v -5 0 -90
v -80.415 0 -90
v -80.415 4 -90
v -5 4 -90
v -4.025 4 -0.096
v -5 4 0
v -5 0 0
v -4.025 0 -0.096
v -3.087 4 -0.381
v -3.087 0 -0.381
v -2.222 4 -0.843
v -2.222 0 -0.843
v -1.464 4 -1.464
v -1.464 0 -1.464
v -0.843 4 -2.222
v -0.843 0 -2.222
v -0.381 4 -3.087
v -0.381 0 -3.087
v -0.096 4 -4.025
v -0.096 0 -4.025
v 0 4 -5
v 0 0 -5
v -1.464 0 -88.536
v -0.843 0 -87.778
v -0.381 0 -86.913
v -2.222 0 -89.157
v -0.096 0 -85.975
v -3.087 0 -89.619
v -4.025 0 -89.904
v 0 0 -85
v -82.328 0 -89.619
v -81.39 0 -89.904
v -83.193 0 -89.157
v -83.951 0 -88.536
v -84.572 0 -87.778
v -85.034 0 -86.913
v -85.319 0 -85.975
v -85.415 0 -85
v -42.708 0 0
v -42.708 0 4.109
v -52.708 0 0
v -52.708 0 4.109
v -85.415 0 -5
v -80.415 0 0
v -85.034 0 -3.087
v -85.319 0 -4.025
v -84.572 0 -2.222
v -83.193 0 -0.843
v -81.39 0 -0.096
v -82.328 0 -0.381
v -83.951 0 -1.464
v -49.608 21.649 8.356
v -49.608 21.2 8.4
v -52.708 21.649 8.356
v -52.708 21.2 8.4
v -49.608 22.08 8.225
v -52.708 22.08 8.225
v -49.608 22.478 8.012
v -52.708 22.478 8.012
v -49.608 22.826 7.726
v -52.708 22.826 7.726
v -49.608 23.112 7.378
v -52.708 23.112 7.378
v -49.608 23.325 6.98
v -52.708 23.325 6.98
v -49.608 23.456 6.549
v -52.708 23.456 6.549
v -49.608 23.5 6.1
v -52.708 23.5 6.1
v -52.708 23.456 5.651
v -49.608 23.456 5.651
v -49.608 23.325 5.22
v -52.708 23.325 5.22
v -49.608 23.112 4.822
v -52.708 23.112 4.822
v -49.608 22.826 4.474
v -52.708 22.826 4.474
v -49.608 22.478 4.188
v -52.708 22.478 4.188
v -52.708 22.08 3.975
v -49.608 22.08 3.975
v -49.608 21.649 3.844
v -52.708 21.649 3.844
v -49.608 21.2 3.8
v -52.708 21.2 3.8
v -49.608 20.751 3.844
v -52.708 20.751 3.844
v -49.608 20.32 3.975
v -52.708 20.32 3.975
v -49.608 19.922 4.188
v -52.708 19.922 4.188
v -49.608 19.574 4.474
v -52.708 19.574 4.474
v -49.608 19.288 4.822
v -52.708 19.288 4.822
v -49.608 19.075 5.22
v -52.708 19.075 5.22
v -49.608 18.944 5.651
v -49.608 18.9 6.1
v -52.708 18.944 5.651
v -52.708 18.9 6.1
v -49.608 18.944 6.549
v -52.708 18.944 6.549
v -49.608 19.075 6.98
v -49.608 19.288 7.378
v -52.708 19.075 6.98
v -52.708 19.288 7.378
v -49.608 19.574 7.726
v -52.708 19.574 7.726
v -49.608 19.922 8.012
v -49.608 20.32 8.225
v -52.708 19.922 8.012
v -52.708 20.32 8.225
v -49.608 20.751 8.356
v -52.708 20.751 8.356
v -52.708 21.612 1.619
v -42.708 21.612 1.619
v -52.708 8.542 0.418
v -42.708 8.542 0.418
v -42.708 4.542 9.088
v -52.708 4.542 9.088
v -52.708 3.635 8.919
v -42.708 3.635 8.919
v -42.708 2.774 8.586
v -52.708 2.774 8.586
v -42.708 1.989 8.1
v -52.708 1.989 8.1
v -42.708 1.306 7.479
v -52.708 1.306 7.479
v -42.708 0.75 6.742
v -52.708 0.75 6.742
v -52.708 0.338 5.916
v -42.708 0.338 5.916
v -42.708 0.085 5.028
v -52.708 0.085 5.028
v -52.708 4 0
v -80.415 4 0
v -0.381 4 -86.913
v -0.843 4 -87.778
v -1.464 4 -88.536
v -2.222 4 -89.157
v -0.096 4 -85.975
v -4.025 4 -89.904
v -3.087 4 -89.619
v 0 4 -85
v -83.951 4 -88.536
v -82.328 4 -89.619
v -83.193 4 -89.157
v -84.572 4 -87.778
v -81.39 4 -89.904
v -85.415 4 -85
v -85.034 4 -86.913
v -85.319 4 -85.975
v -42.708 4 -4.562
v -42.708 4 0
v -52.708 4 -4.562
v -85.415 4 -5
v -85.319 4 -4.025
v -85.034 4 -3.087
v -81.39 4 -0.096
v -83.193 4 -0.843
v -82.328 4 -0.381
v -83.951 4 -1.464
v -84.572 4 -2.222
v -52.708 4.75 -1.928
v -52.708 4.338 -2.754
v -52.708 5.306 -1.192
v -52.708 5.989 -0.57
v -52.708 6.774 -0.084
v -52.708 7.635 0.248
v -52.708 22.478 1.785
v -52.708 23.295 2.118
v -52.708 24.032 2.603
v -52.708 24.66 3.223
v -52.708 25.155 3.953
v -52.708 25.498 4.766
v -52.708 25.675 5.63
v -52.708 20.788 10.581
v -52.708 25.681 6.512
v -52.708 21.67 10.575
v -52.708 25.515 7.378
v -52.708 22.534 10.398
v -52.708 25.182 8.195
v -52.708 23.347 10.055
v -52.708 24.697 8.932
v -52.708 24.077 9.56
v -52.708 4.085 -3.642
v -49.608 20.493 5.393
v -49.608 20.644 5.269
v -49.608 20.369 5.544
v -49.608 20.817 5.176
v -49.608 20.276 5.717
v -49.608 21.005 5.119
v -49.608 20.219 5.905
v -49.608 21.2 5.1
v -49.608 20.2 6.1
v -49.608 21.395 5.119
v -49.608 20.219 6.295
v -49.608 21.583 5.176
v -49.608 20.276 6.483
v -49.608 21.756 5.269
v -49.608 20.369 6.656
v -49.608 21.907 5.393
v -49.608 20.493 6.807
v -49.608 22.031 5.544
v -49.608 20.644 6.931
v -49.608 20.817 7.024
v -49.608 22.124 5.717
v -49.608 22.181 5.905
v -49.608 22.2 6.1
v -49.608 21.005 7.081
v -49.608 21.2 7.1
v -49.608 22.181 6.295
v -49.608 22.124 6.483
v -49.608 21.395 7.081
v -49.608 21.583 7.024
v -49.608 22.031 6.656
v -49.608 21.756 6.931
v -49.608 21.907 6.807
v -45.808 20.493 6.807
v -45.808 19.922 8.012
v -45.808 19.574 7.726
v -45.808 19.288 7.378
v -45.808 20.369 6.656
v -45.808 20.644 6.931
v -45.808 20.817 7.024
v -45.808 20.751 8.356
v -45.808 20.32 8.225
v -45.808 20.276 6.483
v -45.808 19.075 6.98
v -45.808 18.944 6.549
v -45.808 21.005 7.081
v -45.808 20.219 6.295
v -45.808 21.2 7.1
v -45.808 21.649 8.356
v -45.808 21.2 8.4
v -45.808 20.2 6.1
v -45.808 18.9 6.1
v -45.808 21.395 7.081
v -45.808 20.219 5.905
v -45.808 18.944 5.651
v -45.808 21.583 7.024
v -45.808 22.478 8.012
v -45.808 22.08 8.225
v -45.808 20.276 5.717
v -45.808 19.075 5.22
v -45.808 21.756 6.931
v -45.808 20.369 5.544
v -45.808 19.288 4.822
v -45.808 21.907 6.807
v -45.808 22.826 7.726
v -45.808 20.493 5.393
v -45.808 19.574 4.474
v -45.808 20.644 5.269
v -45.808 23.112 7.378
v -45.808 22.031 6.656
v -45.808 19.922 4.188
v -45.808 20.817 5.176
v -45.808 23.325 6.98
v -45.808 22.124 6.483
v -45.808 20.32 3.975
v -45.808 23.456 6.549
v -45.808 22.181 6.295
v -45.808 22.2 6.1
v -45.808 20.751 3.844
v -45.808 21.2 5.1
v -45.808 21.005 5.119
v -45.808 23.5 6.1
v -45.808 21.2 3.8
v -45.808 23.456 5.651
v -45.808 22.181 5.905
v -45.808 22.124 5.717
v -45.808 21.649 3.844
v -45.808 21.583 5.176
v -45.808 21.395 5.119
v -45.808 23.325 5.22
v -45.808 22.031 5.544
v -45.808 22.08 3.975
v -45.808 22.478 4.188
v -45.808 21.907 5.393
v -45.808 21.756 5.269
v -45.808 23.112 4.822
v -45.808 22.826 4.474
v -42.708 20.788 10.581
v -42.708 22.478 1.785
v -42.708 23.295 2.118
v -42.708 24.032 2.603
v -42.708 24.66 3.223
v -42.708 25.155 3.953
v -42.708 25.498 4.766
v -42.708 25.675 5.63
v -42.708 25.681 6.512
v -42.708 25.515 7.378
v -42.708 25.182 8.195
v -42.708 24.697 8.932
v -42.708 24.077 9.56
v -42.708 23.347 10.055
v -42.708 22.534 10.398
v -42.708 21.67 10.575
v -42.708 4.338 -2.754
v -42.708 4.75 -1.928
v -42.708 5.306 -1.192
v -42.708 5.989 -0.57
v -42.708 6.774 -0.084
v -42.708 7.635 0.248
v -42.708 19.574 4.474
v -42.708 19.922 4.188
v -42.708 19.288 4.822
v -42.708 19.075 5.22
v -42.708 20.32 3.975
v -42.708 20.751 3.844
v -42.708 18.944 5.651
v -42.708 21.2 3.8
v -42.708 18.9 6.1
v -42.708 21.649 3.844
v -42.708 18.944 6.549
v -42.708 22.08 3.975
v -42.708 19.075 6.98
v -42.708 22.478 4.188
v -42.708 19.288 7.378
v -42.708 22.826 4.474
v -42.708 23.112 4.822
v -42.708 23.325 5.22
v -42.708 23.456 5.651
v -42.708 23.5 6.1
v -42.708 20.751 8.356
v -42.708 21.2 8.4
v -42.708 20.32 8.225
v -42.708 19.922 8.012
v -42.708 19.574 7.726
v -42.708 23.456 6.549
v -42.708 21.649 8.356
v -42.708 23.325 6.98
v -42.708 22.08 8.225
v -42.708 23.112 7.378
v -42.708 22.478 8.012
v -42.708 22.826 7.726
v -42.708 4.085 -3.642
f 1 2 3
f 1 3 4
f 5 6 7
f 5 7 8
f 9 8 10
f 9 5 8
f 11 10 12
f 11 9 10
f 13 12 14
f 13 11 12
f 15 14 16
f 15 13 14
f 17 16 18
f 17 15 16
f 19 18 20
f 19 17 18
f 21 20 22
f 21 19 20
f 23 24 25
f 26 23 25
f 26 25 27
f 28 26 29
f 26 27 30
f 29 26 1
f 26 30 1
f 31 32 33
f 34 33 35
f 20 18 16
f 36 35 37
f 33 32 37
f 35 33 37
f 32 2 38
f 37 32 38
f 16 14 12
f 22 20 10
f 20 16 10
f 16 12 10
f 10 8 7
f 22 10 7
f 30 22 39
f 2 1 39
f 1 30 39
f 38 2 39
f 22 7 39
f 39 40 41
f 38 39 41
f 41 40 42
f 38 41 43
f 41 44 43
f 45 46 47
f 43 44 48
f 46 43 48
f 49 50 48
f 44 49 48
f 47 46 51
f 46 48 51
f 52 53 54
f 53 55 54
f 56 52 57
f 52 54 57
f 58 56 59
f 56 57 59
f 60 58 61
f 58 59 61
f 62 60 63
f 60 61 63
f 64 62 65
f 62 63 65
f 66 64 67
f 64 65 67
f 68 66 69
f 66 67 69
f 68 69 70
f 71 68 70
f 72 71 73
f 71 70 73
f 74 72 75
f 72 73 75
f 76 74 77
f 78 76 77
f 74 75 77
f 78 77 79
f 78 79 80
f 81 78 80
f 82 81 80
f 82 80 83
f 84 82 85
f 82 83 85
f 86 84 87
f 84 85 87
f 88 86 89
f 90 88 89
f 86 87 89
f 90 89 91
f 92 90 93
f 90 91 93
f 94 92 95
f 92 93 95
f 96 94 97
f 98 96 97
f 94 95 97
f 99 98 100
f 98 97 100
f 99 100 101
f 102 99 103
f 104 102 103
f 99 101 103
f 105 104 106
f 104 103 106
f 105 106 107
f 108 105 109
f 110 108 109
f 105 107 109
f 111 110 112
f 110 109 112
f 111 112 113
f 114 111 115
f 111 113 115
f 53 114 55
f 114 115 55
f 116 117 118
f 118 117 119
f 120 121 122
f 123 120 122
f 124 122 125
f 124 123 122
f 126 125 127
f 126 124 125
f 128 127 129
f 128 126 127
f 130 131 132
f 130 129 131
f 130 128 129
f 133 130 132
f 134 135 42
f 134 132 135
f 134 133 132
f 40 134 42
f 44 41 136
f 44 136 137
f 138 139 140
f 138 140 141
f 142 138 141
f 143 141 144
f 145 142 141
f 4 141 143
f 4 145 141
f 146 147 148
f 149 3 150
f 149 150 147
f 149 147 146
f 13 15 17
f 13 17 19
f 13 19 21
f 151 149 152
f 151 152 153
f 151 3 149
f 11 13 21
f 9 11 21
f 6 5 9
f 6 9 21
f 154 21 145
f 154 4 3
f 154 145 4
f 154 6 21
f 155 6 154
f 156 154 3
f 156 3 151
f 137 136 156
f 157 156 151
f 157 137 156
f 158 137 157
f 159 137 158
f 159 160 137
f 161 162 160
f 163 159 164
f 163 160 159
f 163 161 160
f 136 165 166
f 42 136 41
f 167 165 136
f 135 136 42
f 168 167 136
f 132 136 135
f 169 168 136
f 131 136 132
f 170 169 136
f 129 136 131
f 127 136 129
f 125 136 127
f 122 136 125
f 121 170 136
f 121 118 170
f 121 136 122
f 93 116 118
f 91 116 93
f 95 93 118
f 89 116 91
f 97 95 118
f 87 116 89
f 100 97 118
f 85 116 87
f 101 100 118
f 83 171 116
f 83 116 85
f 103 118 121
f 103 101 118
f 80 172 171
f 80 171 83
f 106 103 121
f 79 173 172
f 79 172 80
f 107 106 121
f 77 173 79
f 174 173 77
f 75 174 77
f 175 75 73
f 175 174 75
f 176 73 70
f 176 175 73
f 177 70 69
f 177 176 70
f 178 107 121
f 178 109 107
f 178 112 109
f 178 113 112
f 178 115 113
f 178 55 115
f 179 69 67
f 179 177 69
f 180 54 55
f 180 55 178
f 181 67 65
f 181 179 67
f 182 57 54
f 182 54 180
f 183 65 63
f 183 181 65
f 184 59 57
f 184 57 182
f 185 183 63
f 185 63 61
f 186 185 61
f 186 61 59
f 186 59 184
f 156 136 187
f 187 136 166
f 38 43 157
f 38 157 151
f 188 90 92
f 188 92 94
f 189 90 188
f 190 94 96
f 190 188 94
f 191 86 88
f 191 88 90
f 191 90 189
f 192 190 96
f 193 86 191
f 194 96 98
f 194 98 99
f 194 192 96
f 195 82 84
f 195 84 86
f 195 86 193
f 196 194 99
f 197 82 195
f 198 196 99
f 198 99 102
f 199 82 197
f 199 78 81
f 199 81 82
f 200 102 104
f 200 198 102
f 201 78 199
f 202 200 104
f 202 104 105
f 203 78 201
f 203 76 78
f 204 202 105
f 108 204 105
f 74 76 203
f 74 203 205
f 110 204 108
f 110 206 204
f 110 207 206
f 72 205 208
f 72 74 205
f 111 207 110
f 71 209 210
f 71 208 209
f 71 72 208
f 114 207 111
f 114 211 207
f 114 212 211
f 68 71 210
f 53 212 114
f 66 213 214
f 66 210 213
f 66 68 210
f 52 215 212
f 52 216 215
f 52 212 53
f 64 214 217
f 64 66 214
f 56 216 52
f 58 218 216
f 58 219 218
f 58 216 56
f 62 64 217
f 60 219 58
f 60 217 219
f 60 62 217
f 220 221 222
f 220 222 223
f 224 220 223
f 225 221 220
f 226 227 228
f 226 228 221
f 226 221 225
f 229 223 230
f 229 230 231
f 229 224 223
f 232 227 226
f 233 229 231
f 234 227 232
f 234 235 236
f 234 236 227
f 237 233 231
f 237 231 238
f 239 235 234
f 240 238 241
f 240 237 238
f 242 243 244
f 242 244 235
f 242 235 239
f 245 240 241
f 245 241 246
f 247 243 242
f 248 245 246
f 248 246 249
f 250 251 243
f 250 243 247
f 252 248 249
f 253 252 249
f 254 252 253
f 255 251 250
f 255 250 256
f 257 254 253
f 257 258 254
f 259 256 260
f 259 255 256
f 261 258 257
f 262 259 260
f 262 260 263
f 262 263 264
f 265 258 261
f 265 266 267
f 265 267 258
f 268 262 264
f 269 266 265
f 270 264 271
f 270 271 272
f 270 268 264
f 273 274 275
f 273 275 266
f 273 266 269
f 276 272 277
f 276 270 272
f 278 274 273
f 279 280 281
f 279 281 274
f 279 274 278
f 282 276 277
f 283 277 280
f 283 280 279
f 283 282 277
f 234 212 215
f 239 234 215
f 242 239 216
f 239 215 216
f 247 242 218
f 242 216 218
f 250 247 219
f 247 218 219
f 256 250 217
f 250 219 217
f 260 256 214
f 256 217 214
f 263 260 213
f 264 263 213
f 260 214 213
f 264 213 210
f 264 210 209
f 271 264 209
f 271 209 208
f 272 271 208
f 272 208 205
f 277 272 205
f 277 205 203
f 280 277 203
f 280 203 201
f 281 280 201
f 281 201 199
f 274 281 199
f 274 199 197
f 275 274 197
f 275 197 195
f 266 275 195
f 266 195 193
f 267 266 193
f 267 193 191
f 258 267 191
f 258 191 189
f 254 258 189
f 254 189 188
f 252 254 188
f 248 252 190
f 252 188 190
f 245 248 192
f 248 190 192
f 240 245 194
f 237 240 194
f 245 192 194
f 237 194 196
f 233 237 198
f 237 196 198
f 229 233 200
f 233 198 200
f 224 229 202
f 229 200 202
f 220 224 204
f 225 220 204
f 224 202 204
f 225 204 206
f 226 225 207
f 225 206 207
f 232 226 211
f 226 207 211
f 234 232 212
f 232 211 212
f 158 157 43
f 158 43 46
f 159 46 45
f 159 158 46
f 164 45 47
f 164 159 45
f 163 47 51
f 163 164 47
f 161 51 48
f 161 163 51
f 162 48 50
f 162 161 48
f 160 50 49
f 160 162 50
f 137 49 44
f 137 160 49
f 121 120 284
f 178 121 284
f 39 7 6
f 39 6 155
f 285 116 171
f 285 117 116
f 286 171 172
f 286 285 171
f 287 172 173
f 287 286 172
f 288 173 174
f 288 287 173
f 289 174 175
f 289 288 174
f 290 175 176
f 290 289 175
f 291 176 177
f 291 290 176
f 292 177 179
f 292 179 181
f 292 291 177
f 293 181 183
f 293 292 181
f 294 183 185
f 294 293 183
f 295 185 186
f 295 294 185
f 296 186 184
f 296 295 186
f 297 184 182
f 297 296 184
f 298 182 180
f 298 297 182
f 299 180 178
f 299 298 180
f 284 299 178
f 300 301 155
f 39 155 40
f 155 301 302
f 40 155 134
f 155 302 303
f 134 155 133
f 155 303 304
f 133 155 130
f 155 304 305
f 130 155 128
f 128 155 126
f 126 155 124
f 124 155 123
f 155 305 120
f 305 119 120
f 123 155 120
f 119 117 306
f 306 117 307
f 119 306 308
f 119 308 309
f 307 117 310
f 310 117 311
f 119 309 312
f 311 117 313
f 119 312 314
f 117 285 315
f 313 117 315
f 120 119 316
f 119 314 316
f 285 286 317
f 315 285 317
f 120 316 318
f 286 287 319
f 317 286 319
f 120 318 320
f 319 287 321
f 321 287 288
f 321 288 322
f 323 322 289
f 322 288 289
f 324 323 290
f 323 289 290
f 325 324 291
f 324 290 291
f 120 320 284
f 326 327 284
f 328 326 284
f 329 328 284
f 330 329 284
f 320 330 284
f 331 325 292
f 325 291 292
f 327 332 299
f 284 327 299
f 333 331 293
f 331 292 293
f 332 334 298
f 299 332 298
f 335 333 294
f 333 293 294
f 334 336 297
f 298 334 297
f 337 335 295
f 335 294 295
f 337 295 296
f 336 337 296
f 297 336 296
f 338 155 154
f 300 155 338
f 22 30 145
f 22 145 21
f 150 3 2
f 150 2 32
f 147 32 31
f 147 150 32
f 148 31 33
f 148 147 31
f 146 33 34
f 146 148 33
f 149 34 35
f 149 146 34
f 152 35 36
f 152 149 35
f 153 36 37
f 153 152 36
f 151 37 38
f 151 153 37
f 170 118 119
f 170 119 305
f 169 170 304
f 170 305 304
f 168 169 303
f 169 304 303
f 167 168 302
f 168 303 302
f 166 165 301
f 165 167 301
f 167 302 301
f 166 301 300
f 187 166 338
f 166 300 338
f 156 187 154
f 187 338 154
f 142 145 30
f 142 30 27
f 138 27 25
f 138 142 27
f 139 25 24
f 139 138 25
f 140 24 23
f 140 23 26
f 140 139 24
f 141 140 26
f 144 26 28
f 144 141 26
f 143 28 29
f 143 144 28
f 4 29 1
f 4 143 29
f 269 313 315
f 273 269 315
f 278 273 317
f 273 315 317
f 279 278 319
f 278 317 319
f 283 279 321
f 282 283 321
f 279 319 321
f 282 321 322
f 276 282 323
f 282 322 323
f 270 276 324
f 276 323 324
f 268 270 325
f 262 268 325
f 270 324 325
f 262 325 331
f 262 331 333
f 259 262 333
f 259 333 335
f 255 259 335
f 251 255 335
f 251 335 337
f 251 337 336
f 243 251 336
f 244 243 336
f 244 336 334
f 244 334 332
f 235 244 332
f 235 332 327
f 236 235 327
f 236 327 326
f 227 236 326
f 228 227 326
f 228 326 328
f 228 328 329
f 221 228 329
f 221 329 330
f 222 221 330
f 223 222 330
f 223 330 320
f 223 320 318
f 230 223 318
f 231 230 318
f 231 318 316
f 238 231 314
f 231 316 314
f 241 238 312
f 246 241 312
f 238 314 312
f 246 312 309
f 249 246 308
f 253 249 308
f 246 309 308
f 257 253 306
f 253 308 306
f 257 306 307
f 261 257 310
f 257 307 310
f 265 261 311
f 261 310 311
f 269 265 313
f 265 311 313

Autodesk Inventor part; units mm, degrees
ref_plane "YZ Plane" through (0, 0, 0) normal (1, 0, 0) x (0, 1, 0)
sketch "Sketch1" plane through (0, 0, 0) normal (0, 1, 0) x (-1, 0, 0)
  line L0 (0, 0) -> (85.415, 0)
  line L1 (85.415, 0) -> (85.415, -90)
  line L2 (85.415, -90) -> (0, -90)
  line L3 (0, -90) -> (0, 0)
  dimension "d0" = 85.415
  dimension "d1" = 90
extrude "Extrusion1" add sketch "Sketch1" along normal blind 4
ref_plane "Work Plane1" through (-42.7075, 0, 0) normal (1, 0, 0) x (0, 0, -1)
ref_plane "Work Plane2" through (-42.7075, 0, -90) normal (-1, 0, 0) x (0, 0, 1)
sketch "Sketch5" plane through (-42.7075, 0, -90) normal (-1, 0, 0) x (0, 0, 1)
  line L0 (90, 0) -> (90, 4) construction
  line L1 (90, 4) -> (96.1, 4) construction
  line L2 (96.1, 4) -> (96.1, 21.2) construction
  line L3 (96.1, 21.2) -> (90, 21.2) construction
  line L4 (90, 21.2) -> (90, 4) construction
  circle A0 centre (96.1, 21.2) radius 4.5
  line L5 (90, 0) -> (0, 0) projected
  line L6 (0, 0) -> (0, 4) projected
  line L7 (90, 4) -> (0, 4) projected
  line L8 (90, 0) -> (90, 4) projected
  line L9 (91.6189, 21.6119) -> (90.4175, 8.5423)
  line L10 (99.0878, 4.5423) -> (100.5811, 20.7881)
  line L11 (90, 0) -> (90, 4) projected
  line L12 (90, 0) -> (94.1088, 0)
  line L13 (85.4385, 4) -> (75.881, 4)
  line L14 (90, 4) -> (0, 4) projected
  arc A1 (85.4385, 4) -> (90.4175, 8.5423) centre (85.4385, 9) ccw
  arc A2 (94.1088, 0) -> (99.0878, 4.5423) centre (94.1088, 5) ccw
  point P0 (92.3607, 23.7035)
  dimension "d14" = 6.1
  dimension "d15" = 17.2
  dimension "d16" = 9
  dimension "d29" = 5
extrude "Extrusion4" add sketch "Sketch5" along normal blind 10 contours A0 | A0 L10 A2 L12 L8 L7 A1 L9
sketch "Sketch6" plane through (-42.7075, 0, -90) normal (1, 0, 0) x (0, 0, -1)
  arc A0 (-91.6189, 21.6119) -> (-100.5811, 20.7881) centre (-96.1, 21.2) ccw projected
  circle A1 centre (-96.1, 21.2) radius 2.3
  point P0 (-90, 0)
  point P1 (-99.8393, 18.6965)
  point P2 (-92.3607, 23.7035)
  dimension "d19" = 4.6
extrude "Extrusion5" cut sketch "Sketch6" against normal blind 3.1
sketch "Sketch7" plane through (-52.7075, 0, -90) normal (-1, 0, 0) x (0, 0, 1)
  arc A0 (100.5811, 20.7881) -> (91.6189, 21.6119) centre (96.1, 21.2) ccw projected
  circle A1 centre (96.1, 21.2) radius 2.3
  point P0 (90, 0)
  point P1 (99.8393, 18.6965)
  point P2 (92.3607, 23.7035)
  dimension "d22" = 4.6
extrude "Extrusion6" cut sketch "Sketch7" against normal blind 3.1
sketch "Sketch8" plane through (-49.6075, 21.2, 6.1) normal (-1, 0, 0) x (0, 0, 1)
  circle A0 centre (0, 0) radius 2.3 projected
  circle A1 centre (0, 0) radius 1
  point P0 (-6.1, -21.2)
  dimension "d25" = 2
extrude "Extrusion7" cut sketch "Sketch8" against normal through all contours A1
fillet "Fillet2" radius 5 4 edges at (-85.415, 2, 0) (0, 2, 0) (0, 2, -90) (-85.415, 2, -90)
properties part number "Tapas" material "ABS Plastic"
